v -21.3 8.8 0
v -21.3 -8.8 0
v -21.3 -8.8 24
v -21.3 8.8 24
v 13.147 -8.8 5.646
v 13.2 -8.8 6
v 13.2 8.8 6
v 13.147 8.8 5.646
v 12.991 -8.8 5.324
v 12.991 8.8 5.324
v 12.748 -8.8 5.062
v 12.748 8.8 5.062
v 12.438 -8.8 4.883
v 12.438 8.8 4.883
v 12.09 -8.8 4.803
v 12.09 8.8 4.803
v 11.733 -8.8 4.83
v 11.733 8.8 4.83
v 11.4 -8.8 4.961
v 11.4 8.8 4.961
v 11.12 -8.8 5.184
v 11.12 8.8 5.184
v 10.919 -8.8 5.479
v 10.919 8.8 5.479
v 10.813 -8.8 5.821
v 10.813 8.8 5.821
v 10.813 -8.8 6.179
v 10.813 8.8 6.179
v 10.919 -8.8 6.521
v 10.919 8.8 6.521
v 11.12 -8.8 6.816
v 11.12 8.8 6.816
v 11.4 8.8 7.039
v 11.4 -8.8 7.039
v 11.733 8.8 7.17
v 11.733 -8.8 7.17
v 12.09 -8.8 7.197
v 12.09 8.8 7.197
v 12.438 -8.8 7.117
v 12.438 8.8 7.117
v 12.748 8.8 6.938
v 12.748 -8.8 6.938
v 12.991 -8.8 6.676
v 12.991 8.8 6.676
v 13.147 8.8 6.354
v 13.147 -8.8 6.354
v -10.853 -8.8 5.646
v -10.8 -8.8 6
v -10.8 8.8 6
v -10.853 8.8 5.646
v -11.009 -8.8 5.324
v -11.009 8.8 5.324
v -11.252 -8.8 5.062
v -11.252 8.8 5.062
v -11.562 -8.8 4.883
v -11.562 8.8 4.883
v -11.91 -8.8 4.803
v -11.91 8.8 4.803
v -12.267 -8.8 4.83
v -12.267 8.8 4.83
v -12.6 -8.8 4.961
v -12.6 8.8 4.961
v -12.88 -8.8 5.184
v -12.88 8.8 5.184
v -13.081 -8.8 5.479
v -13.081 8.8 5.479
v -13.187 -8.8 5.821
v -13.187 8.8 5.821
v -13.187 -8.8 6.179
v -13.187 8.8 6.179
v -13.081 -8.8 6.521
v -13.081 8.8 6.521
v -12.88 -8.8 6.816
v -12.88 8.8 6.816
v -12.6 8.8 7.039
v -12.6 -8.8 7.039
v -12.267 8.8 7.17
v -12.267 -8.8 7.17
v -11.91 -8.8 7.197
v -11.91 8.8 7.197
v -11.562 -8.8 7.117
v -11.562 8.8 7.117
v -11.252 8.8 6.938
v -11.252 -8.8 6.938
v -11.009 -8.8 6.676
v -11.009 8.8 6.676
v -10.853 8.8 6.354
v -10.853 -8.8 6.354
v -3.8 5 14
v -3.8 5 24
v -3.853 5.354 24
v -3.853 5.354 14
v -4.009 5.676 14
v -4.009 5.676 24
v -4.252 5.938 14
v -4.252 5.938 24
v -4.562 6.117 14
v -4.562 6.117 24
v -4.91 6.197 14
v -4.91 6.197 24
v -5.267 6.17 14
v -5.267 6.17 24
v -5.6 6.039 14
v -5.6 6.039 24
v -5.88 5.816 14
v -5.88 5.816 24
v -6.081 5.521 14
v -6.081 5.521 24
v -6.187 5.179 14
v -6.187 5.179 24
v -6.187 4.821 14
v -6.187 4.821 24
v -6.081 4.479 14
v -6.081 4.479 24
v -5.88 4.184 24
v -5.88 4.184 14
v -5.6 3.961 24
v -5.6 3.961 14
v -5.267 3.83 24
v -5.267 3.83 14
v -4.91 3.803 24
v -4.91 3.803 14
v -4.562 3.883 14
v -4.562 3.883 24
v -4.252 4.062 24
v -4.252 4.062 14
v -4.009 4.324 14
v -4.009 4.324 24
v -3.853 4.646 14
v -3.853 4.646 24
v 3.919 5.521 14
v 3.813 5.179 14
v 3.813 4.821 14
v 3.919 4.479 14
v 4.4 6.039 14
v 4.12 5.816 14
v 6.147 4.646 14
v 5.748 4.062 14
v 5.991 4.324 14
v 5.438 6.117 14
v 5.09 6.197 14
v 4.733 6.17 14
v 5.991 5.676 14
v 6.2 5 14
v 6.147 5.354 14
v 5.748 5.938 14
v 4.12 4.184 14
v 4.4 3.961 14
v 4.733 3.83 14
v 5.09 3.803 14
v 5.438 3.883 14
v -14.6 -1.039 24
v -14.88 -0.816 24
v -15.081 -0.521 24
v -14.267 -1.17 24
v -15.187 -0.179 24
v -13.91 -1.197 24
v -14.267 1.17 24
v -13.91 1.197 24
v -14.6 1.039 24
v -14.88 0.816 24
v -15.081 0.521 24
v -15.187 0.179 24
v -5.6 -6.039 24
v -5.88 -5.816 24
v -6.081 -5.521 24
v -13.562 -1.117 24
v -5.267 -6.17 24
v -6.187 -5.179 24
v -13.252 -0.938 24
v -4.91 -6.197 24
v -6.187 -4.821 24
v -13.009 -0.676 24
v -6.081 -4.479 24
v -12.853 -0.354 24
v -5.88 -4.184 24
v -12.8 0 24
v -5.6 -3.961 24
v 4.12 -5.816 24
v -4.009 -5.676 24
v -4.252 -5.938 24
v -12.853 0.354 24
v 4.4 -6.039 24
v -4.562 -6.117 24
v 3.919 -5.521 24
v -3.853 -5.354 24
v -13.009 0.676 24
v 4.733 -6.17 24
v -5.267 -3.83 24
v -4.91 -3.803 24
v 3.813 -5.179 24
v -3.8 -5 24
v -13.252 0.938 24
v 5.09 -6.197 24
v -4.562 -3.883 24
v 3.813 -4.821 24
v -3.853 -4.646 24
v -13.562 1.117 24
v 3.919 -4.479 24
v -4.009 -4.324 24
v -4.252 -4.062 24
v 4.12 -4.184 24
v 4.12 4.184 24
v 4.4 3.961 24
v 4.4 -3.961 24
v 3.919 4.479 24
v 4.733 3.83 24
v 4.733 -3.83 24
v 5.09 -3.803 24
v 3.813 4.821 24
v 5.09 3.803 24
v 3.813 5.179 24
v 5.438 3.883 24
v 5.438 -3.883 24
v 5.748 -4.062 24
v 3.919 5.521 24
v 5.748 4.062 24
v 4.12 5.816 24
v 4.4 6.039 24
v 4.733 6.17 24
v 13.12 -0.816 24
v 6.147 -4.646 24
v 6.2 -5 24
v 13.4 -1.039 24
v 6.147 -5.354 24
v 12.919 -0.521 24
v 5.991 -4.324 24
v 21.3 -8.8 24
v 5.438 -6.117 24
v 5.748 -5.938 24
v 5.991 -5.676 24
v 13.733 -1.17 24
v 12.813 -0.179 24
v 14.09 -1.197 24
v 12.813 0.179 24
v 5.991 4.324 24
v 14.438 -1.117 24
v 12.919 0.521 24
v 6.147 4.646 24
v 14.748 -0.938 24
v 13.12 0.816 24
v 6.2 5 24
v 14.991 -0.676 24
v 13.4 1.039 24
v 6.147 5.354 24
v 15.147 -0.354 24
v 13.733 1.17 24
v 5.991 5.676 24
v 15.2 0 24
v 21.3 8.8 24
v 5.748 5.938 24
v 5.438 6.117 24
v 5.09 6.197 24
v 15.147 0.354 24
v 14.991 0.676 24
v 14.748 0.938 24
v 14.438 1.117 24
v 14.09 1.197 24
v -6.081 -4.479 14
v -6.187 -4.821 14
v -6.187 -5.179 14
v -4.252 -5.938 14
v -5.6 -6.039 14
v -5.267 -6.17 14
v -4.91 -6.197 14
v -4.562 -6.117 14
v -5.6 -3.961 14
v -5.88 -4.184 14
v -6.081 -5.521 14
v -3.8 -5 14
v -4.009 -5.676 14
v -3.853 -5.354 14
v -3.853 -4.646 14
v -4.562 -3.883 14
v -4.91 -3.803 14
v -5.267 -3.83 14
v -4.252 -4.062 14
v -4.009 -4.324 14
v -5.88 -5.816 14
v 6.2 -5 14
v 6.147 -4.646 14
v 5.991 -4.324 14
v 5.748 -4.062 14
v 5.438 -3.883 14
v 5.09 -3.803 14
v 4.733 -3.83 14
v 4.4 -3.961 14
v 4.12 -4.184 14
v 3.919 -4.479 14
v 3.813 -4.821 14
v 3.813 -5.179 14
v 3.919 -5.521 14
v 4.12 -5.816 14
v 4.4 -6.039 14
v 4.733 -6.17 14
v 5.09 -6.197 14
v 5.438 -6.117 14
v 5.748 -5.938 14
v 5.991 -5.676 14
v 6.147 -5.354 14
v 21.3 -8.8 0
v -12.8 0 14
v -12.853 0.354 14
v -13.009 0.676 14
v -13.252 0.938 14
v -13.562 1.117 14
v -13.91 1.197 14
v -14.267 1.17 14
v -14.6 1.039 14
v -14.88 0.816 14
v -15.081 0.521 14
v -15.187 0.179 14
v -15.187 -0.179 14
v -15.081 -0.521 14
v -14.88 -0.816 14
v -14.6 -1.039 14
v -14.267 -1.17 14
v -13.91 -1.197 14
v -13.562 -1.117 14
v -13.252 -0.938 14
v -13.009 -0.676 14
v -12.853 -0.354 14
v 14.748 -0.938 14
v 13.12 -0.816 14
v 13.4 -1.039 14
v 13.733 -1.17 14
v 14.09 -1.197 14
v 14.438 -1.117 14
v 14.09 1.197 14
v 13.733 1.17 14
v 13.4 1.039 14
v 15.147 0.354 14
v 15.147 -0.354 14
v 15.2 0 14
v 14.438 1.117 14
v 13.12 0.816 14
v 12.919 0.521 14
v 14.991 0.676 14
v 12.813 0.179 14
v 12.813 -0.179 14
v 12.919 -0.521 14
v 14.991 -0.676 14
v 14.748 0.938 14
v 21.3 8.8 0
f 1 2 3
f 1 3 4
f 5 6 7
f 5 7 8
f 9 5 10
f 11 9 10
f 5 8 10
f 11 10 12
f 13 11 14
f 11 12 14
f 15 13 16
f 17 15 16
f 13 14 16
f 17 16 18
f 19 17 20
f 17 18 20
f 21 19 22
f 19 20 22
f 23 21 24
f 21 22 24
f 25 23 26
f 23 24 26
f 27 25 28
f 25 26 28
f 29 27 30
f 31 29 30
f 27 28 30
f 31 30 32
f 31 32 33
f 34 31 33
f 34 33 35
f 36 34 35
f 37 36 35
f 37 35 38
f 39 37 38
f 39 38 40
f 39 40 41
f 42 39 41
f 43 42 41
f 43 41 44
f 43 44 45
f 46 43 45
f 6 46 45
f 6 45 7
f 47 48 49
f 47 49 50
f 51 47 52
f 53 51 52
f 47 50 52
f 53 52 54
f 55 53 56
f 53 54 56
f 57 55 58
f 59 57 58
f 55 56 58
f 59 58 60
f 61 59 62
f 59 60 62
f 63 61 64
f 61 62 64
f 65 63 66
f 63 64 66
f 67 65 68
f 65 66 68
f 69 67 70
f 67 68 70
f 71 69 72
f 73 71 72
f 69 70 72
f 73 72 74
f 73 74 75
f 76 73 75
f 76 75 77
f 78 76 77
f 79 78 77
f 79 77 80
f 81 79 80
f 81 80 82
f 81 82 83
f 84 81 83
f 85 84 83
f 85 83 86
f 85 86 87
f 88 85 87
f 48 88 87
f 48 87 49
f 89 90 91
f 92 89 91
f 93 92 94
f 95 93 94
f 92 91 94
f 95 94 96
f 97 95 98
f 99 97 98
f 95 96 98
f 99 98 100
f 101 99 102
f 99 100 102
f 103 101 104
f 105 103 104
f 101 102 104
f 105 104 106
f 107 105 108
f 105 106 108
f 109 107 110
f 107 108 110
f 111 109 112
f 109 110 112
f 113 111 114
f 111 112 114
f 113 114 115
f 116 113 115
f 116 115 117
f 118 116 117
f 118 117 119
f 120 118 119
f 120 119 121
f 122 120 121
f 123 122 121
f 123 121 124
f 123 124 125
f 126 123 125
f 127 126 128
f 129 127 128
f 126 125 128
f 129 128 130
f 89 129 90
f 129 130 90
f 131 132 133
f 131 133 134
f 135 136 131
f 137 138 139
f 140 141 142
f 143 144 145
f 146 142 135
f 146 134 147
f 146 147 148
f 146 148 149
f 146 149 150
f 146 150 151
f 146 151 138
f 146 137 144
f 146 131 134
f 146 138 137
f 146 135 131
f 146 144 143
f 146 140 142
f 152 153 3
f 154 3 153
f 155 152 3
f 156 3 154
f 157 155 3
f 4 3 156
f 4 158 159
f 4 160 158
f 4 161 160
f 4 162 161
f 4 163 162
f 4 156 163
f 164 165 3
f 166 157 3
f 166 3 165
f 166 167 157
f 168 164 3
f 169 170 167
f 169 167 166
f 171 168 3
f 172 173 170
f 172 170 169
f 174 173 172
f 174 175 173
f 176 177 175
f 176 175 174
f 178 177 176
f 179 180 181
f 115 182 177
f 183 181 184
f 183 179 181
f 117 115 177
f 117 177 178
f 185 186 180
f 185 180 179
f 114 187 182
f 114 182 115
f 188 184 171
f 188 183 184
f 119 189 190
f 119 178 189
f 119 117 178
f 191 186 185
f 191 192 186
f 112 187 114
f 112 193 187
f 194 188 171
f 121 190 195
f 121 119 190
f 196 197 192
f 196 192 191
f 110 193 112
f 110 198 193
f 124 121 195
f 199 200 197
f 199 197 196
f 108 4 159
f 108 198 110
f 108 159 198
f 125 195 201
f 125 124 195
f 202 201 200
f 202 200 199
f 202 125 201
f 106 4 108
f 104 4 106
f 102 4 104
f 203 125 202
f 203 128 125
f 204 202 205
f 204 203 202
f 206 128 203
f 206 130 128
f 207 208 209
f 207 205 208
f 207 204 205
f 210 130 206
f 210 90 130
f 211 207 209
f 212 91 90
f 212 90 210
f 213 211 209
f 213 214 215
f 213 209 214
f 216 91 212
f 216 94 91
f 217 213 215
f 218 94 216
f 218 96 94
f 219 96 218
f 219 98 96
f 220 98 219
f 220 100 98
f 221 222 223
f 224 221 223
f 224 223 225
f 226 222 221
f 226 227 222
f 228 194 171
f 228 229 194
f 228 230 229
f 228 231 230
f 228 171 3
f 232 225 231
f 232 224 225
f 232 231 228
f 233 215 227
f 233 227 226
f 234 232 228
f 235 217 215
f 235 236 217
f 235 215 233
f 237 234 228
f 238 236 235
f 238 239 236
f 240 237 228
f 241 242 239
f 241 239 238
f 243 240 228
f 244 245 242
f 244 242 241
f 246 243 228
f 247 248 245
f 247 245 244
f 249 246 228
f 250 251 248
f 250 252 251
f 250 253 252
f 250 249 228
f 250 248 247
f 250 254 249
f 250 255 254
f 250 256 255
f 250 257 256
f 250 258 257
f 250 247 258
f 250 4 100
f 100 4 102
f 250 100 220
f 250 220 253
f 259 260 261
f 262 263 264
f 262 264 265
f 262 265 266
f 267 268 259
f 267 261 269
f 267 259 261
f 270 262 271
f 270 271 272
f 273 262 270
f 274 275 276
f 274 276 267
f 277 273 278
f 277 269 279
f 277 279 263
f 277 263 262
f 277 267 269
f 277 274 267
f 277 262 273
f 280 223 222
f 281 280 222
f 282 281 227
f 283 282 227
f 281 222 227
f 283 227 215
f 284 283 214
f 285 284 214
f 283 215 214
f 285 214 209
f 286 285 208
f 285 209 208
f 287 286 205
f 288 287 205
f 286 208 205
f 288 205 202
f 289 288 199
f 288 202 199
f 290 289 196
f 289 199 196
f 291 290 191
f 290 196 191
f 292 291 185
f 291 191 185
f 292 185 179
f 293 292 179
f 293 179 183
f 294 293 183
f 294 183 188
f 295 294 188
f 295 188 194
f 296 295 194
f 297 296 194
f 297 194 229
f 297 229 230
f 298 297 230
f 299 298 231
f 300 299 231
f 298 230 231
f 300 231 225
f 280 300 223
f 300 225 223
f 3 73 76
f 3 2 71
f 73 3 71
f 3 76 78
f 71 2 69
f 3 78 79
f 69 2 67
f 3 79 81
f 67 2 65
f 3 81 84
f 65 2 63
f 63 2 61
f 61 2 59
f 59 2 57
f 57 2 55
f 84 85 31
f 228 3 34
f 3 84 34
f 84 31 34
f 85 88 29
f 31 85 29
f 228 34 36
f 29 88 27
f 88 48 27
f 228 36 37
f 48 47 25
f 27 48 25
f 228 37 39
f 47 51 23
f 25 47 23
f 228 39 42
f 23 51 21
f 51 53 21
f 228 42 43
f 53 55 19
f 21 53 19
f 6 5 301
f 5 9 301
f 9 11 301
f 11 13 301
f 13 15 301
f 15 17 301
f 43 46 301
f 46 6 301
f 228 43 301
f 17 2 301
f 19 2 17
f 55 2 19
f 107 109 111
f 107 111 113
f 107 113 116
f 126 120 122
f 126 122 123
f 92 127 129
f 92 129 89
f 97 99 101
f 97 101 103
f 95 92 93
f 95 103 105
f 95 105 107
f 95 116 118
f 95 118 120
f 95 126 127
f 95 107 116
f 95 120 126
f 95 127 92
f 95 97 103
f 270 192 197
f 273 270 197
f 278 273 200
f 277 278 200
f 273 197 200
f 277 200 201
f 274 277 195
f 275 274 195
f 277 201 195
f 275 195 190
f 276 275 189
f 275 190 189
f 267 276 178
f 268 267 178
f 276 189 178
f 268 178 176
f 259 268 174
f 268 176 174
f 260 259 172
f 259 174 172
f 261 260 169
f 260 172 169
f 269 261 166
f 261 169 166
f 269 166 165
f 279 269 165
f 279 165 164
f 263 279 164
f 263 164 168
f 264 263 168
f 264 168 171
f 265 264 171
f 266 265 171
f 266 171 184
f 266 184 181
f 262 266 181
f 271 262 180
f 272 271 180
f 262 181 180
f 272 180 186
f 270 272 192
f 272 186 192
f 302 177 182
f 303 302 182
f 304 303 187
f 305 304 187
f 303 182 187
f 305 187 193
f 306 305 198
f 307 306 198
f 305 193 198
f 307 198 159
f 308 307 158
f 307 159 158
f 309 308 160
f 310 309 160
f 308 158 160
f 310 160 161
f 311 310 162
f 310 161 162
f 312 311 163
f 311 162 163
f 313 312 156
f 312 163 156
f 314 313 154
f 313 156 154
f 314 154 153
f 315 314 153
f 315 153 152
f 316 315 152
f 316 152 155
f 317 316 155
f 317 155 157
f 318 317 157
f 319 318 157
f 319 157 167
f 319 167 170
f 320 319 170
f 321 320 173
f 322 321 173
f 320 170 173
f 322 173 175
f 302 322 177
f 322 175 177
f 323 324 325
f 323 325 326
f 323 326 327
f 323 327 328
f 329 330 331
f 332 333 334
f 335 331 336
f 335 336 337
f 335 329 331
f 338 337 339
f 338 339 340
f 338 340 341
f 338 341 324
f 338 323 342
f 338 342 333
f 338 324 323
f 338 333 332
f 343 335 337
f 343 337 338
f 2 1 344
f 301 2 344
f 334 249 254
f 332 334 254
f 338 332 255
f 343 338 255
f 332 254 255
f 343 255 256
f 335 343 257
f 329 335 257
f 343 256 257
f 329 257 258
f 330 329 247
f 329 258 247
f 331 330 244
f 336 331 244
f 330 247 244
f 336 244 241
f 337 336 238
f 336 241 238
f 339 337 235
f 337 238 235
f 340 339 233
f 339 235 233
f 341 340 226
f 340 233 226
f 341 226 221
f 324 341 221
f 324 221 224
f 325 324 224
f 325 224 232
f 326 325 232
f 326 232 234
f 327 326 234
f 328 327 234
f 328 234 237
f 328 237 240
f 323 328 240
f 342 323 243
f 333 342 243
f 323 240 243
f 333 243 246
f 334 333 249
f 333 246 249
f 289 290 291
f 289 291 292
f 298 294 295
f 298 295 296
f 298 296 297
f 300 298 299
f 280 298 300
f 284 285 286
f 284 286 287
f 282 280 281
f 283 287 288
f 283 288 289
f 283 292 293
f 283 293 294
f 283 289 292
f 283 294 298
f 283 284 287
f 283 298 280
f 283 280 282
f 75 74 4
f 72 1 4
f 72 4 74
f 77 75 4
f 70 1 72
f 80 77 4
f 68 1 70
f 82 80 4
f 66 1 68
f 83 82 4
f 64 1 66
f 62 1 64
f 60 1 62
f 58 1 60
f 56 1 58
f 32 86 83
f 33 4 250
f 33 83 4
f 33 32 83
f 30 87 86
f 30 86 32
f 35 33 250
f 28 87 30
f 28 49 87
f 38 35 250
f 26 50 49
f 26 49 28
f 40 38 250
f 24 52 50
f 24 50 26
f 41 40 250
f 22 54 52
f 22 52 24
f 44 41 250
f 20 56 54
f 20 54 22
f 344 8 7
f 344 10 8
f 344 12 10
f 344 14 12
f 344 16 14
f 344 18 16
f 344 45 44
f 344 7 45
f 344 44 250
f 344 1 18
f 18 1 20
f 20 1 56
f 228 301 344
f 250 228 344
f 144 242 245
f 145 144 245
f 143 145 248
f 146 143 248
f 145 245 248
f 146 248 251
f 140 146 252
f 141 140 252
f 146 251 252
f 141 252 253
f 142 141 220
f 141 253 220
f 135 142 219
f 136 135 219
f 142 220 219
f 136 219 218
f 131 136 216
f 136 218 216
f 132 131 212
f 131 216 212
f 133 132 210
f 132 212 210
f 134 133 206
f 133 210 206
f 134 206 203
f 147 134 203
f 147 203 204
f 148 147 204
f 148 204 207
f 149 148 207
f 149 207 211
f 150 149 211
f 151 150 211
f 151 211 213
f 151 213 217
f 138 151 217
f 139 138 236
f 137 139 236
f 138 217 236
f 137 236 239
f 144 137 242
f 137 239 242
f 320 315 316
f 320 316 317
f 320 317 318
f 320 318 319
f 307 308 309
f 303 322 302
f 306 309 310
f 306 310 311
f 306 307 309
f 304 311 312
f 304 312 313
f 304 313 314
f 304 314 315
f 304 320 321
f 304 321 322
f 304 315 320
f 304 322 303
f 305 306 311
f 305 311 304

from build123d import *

# Parameters (mm, degrees)
CROQUIS1_W              = 42.6
CROQUIS1_H              = 17.6
SALIENTE_EXTRUIR1_DEPTH = 24
CROQUIS2_R              = 1.2
CORTAR_EXTRUIR1_DEPTH   = 24
CROQUIS4_R              = 1.2
CORTAR_EXTRUIR2_DEPTH   = 10


with BuildPart() as part:
    # Croquis1 → Saliente-Extruir1 (new body)
    with BuildSketch(Plane.XY):
        Rectangle(CROQUIS1_W, CROQUIS1_H)
    extrude(amount=SALIENTE_EXTRUIR1_DEPTH)

    # Croquis2 → Cortar-Extruir1 (cut)
    with BuildSketch(Plane(origin=(0, 8.8, 0), x_dir=(1, 0, 0), z_dir=(0, 1, 0))):
        with Locations((-12, -6)):
            Circle(CROQUIS2_R)
        with Locations((12, -6)):
            Circle(CROQUIS2_R)
    extrude(amount=-CORTAR_EXTRUIR1_DEPTH, mode=Mode.SUBTRACT)

    # Croquis4 → Cortar-Extruir2 (cut)
    with BuildSketch(Plane.XY.offset(24)):
        with Locations((-14, 0)):
            Circle(CROQUIS4_R)
        with Locations((-5, 5)):
            Circle(CROQUIS4_R)
        with Locations((5, 5)):
            Circle(CROQUIS4_R)
        with Locations((14, 0)):
            Circle(CROQUIS4_R)
        with Locations((5, -5)):
            Circle(CROQUIS4_R)
        with Locations((-5, -5)):
            Circle(CROQUIS4_R)
    extrude(amount=-CORTAR_EXTRUIR2_DEPTH, mode=Mode.SUBTRACT)


solid = part.part
